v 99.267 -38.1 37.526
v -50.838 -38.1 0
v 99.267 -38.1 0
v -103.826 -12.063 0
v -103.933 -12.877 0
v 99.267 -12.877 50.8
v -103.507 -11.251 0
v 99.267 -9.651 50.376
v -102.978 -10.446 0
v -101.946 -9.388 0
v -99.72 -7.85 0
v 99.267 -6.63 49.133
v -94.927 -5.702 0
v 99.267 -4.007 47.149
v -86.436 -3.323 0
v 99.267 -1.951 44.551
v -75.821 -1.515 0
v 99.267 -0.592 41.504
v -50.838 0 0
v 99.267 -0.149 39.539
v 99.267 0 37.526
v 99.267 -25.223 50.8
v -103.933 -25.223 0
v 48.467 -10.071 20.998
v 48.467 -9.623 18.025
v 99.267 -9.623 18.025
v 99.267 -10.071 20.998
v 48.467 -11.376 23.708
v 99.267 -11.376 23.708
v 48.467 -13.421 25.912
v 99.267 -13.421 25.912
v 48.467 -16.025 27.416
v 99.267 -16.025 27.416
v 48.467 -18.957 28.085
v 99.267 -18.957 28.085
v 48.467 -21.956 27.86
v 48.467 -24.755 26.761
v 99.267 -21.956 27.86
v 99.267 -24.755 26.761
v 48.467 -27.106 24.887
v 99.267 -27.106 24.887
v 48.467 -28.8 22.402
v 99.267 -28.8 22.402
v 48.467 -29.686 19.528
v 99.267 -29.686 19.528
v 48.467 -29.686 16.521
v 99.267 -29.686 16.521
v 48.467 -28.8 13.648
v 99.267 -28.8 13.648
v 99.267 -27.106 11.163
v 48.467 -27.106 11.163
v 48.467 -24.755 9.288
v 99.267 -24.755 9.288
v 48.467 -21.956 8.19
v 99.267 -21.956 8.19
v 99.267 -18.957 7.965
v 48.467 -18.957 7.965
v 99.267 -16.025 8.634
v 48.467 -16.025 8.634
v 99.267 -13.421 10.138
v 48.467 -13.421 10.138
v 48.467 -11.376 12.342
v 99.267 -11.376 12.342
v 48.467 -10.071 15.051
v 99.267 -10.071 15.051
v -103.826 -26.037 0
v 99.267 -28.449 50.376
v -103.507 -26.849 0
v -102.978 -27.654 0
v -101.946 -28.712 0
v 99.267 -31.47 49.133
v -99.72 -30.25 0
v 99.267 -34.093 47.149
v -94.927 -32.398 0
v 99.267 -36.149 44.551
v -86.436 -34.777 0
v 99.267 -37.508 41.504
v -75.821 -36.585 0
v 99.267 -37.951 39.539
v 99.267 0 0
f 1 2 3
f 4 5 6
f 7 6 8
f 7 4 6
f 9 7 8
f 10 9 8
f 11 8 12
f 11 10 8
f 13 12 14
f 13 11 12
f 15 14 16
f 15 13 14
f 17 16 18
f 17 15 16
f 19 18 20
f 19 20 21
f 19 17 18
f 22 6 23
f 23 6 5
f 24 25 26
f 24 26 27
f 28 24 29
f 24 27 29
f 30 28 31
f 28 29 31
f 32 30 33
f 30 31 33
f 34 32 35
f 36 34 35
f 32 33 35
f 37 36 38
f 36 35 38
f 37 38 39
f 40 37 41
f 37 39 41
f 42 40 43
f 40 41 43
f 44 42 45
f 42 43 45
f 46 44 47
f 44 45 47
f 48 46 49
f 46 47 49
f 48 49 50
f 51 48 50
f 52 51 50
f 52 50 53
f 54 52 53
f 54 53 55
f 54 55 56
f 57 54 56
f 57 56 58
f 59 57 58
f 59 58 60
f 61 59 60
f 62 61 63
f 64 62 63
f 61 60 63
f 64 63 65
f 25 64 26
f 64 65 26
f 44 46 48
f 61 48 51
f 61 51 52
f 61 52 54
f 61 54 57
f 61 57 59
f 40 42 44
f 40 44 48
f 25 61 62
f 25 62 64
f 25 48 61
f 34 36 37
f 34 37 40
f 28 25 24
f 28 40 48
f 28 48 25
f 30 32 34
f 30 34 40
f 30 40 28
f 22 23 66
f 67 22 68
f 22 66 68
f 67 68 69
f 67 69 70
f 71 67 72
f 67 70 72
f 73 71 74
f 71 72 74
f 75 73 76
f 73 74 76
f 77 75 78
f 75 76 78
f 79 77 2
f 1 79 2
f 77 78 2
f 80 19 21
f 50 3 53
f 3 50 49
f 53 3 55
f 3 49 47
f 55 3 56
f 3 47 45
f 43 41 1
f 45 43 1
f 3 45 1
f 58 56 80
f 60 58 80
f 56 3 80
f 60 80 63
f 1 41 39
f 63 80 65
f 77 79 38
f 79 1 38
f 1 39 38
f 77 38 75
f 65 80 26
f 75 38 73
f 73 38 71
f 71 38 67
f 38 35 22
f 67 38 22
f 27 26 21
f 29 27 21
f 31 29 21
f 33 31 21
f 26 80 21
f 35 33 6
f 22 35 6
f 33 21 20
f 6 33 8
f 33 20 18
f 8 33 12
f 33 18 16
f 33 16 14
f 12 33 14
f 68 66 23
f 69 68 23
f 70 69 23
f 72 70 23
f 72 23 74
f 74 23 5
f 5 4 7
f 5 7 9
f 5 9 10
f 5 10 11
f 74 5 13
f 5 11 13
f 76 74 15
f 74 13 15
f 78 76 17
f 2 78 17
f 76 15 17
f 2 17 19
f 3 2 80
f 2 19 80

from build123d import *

# Parameters (mm, degrees)
F1_DEPTH = 38.1
F2_R     = 12.877415
F3_R     = 10.088081
F4_DEPTH = 50.8


with BuildPart() as f1:
    # F0 (on Front) → F1 (new body)
    with BuildSketch(Plane.XZ):
        Polygon((-103.93265, 0), (99.26735, 0), (99.26735, 50.8), align=None)
    extrude(amount=F1_DEPTH)

    # F2
    f2_edges = [f1.edges().sort_by_distance(p)[0] for p in [
        (-2.33265, 0, 25.4),
        (-2.33265, -38.1, 25.4),
    ]]
    fillet(f2_edges, radius=F2_R)

    # F3 (on face) → F4 (cut)
    with BuildSketch(Plane.YZ.offset(99.26735)):
        with Locations((-19.710729, 18.024944)):
            Circle(F3_R)
    extrude(amount=-F4_DEPTH, mode=Mode.SUBTRACT)


solid = f1.part
